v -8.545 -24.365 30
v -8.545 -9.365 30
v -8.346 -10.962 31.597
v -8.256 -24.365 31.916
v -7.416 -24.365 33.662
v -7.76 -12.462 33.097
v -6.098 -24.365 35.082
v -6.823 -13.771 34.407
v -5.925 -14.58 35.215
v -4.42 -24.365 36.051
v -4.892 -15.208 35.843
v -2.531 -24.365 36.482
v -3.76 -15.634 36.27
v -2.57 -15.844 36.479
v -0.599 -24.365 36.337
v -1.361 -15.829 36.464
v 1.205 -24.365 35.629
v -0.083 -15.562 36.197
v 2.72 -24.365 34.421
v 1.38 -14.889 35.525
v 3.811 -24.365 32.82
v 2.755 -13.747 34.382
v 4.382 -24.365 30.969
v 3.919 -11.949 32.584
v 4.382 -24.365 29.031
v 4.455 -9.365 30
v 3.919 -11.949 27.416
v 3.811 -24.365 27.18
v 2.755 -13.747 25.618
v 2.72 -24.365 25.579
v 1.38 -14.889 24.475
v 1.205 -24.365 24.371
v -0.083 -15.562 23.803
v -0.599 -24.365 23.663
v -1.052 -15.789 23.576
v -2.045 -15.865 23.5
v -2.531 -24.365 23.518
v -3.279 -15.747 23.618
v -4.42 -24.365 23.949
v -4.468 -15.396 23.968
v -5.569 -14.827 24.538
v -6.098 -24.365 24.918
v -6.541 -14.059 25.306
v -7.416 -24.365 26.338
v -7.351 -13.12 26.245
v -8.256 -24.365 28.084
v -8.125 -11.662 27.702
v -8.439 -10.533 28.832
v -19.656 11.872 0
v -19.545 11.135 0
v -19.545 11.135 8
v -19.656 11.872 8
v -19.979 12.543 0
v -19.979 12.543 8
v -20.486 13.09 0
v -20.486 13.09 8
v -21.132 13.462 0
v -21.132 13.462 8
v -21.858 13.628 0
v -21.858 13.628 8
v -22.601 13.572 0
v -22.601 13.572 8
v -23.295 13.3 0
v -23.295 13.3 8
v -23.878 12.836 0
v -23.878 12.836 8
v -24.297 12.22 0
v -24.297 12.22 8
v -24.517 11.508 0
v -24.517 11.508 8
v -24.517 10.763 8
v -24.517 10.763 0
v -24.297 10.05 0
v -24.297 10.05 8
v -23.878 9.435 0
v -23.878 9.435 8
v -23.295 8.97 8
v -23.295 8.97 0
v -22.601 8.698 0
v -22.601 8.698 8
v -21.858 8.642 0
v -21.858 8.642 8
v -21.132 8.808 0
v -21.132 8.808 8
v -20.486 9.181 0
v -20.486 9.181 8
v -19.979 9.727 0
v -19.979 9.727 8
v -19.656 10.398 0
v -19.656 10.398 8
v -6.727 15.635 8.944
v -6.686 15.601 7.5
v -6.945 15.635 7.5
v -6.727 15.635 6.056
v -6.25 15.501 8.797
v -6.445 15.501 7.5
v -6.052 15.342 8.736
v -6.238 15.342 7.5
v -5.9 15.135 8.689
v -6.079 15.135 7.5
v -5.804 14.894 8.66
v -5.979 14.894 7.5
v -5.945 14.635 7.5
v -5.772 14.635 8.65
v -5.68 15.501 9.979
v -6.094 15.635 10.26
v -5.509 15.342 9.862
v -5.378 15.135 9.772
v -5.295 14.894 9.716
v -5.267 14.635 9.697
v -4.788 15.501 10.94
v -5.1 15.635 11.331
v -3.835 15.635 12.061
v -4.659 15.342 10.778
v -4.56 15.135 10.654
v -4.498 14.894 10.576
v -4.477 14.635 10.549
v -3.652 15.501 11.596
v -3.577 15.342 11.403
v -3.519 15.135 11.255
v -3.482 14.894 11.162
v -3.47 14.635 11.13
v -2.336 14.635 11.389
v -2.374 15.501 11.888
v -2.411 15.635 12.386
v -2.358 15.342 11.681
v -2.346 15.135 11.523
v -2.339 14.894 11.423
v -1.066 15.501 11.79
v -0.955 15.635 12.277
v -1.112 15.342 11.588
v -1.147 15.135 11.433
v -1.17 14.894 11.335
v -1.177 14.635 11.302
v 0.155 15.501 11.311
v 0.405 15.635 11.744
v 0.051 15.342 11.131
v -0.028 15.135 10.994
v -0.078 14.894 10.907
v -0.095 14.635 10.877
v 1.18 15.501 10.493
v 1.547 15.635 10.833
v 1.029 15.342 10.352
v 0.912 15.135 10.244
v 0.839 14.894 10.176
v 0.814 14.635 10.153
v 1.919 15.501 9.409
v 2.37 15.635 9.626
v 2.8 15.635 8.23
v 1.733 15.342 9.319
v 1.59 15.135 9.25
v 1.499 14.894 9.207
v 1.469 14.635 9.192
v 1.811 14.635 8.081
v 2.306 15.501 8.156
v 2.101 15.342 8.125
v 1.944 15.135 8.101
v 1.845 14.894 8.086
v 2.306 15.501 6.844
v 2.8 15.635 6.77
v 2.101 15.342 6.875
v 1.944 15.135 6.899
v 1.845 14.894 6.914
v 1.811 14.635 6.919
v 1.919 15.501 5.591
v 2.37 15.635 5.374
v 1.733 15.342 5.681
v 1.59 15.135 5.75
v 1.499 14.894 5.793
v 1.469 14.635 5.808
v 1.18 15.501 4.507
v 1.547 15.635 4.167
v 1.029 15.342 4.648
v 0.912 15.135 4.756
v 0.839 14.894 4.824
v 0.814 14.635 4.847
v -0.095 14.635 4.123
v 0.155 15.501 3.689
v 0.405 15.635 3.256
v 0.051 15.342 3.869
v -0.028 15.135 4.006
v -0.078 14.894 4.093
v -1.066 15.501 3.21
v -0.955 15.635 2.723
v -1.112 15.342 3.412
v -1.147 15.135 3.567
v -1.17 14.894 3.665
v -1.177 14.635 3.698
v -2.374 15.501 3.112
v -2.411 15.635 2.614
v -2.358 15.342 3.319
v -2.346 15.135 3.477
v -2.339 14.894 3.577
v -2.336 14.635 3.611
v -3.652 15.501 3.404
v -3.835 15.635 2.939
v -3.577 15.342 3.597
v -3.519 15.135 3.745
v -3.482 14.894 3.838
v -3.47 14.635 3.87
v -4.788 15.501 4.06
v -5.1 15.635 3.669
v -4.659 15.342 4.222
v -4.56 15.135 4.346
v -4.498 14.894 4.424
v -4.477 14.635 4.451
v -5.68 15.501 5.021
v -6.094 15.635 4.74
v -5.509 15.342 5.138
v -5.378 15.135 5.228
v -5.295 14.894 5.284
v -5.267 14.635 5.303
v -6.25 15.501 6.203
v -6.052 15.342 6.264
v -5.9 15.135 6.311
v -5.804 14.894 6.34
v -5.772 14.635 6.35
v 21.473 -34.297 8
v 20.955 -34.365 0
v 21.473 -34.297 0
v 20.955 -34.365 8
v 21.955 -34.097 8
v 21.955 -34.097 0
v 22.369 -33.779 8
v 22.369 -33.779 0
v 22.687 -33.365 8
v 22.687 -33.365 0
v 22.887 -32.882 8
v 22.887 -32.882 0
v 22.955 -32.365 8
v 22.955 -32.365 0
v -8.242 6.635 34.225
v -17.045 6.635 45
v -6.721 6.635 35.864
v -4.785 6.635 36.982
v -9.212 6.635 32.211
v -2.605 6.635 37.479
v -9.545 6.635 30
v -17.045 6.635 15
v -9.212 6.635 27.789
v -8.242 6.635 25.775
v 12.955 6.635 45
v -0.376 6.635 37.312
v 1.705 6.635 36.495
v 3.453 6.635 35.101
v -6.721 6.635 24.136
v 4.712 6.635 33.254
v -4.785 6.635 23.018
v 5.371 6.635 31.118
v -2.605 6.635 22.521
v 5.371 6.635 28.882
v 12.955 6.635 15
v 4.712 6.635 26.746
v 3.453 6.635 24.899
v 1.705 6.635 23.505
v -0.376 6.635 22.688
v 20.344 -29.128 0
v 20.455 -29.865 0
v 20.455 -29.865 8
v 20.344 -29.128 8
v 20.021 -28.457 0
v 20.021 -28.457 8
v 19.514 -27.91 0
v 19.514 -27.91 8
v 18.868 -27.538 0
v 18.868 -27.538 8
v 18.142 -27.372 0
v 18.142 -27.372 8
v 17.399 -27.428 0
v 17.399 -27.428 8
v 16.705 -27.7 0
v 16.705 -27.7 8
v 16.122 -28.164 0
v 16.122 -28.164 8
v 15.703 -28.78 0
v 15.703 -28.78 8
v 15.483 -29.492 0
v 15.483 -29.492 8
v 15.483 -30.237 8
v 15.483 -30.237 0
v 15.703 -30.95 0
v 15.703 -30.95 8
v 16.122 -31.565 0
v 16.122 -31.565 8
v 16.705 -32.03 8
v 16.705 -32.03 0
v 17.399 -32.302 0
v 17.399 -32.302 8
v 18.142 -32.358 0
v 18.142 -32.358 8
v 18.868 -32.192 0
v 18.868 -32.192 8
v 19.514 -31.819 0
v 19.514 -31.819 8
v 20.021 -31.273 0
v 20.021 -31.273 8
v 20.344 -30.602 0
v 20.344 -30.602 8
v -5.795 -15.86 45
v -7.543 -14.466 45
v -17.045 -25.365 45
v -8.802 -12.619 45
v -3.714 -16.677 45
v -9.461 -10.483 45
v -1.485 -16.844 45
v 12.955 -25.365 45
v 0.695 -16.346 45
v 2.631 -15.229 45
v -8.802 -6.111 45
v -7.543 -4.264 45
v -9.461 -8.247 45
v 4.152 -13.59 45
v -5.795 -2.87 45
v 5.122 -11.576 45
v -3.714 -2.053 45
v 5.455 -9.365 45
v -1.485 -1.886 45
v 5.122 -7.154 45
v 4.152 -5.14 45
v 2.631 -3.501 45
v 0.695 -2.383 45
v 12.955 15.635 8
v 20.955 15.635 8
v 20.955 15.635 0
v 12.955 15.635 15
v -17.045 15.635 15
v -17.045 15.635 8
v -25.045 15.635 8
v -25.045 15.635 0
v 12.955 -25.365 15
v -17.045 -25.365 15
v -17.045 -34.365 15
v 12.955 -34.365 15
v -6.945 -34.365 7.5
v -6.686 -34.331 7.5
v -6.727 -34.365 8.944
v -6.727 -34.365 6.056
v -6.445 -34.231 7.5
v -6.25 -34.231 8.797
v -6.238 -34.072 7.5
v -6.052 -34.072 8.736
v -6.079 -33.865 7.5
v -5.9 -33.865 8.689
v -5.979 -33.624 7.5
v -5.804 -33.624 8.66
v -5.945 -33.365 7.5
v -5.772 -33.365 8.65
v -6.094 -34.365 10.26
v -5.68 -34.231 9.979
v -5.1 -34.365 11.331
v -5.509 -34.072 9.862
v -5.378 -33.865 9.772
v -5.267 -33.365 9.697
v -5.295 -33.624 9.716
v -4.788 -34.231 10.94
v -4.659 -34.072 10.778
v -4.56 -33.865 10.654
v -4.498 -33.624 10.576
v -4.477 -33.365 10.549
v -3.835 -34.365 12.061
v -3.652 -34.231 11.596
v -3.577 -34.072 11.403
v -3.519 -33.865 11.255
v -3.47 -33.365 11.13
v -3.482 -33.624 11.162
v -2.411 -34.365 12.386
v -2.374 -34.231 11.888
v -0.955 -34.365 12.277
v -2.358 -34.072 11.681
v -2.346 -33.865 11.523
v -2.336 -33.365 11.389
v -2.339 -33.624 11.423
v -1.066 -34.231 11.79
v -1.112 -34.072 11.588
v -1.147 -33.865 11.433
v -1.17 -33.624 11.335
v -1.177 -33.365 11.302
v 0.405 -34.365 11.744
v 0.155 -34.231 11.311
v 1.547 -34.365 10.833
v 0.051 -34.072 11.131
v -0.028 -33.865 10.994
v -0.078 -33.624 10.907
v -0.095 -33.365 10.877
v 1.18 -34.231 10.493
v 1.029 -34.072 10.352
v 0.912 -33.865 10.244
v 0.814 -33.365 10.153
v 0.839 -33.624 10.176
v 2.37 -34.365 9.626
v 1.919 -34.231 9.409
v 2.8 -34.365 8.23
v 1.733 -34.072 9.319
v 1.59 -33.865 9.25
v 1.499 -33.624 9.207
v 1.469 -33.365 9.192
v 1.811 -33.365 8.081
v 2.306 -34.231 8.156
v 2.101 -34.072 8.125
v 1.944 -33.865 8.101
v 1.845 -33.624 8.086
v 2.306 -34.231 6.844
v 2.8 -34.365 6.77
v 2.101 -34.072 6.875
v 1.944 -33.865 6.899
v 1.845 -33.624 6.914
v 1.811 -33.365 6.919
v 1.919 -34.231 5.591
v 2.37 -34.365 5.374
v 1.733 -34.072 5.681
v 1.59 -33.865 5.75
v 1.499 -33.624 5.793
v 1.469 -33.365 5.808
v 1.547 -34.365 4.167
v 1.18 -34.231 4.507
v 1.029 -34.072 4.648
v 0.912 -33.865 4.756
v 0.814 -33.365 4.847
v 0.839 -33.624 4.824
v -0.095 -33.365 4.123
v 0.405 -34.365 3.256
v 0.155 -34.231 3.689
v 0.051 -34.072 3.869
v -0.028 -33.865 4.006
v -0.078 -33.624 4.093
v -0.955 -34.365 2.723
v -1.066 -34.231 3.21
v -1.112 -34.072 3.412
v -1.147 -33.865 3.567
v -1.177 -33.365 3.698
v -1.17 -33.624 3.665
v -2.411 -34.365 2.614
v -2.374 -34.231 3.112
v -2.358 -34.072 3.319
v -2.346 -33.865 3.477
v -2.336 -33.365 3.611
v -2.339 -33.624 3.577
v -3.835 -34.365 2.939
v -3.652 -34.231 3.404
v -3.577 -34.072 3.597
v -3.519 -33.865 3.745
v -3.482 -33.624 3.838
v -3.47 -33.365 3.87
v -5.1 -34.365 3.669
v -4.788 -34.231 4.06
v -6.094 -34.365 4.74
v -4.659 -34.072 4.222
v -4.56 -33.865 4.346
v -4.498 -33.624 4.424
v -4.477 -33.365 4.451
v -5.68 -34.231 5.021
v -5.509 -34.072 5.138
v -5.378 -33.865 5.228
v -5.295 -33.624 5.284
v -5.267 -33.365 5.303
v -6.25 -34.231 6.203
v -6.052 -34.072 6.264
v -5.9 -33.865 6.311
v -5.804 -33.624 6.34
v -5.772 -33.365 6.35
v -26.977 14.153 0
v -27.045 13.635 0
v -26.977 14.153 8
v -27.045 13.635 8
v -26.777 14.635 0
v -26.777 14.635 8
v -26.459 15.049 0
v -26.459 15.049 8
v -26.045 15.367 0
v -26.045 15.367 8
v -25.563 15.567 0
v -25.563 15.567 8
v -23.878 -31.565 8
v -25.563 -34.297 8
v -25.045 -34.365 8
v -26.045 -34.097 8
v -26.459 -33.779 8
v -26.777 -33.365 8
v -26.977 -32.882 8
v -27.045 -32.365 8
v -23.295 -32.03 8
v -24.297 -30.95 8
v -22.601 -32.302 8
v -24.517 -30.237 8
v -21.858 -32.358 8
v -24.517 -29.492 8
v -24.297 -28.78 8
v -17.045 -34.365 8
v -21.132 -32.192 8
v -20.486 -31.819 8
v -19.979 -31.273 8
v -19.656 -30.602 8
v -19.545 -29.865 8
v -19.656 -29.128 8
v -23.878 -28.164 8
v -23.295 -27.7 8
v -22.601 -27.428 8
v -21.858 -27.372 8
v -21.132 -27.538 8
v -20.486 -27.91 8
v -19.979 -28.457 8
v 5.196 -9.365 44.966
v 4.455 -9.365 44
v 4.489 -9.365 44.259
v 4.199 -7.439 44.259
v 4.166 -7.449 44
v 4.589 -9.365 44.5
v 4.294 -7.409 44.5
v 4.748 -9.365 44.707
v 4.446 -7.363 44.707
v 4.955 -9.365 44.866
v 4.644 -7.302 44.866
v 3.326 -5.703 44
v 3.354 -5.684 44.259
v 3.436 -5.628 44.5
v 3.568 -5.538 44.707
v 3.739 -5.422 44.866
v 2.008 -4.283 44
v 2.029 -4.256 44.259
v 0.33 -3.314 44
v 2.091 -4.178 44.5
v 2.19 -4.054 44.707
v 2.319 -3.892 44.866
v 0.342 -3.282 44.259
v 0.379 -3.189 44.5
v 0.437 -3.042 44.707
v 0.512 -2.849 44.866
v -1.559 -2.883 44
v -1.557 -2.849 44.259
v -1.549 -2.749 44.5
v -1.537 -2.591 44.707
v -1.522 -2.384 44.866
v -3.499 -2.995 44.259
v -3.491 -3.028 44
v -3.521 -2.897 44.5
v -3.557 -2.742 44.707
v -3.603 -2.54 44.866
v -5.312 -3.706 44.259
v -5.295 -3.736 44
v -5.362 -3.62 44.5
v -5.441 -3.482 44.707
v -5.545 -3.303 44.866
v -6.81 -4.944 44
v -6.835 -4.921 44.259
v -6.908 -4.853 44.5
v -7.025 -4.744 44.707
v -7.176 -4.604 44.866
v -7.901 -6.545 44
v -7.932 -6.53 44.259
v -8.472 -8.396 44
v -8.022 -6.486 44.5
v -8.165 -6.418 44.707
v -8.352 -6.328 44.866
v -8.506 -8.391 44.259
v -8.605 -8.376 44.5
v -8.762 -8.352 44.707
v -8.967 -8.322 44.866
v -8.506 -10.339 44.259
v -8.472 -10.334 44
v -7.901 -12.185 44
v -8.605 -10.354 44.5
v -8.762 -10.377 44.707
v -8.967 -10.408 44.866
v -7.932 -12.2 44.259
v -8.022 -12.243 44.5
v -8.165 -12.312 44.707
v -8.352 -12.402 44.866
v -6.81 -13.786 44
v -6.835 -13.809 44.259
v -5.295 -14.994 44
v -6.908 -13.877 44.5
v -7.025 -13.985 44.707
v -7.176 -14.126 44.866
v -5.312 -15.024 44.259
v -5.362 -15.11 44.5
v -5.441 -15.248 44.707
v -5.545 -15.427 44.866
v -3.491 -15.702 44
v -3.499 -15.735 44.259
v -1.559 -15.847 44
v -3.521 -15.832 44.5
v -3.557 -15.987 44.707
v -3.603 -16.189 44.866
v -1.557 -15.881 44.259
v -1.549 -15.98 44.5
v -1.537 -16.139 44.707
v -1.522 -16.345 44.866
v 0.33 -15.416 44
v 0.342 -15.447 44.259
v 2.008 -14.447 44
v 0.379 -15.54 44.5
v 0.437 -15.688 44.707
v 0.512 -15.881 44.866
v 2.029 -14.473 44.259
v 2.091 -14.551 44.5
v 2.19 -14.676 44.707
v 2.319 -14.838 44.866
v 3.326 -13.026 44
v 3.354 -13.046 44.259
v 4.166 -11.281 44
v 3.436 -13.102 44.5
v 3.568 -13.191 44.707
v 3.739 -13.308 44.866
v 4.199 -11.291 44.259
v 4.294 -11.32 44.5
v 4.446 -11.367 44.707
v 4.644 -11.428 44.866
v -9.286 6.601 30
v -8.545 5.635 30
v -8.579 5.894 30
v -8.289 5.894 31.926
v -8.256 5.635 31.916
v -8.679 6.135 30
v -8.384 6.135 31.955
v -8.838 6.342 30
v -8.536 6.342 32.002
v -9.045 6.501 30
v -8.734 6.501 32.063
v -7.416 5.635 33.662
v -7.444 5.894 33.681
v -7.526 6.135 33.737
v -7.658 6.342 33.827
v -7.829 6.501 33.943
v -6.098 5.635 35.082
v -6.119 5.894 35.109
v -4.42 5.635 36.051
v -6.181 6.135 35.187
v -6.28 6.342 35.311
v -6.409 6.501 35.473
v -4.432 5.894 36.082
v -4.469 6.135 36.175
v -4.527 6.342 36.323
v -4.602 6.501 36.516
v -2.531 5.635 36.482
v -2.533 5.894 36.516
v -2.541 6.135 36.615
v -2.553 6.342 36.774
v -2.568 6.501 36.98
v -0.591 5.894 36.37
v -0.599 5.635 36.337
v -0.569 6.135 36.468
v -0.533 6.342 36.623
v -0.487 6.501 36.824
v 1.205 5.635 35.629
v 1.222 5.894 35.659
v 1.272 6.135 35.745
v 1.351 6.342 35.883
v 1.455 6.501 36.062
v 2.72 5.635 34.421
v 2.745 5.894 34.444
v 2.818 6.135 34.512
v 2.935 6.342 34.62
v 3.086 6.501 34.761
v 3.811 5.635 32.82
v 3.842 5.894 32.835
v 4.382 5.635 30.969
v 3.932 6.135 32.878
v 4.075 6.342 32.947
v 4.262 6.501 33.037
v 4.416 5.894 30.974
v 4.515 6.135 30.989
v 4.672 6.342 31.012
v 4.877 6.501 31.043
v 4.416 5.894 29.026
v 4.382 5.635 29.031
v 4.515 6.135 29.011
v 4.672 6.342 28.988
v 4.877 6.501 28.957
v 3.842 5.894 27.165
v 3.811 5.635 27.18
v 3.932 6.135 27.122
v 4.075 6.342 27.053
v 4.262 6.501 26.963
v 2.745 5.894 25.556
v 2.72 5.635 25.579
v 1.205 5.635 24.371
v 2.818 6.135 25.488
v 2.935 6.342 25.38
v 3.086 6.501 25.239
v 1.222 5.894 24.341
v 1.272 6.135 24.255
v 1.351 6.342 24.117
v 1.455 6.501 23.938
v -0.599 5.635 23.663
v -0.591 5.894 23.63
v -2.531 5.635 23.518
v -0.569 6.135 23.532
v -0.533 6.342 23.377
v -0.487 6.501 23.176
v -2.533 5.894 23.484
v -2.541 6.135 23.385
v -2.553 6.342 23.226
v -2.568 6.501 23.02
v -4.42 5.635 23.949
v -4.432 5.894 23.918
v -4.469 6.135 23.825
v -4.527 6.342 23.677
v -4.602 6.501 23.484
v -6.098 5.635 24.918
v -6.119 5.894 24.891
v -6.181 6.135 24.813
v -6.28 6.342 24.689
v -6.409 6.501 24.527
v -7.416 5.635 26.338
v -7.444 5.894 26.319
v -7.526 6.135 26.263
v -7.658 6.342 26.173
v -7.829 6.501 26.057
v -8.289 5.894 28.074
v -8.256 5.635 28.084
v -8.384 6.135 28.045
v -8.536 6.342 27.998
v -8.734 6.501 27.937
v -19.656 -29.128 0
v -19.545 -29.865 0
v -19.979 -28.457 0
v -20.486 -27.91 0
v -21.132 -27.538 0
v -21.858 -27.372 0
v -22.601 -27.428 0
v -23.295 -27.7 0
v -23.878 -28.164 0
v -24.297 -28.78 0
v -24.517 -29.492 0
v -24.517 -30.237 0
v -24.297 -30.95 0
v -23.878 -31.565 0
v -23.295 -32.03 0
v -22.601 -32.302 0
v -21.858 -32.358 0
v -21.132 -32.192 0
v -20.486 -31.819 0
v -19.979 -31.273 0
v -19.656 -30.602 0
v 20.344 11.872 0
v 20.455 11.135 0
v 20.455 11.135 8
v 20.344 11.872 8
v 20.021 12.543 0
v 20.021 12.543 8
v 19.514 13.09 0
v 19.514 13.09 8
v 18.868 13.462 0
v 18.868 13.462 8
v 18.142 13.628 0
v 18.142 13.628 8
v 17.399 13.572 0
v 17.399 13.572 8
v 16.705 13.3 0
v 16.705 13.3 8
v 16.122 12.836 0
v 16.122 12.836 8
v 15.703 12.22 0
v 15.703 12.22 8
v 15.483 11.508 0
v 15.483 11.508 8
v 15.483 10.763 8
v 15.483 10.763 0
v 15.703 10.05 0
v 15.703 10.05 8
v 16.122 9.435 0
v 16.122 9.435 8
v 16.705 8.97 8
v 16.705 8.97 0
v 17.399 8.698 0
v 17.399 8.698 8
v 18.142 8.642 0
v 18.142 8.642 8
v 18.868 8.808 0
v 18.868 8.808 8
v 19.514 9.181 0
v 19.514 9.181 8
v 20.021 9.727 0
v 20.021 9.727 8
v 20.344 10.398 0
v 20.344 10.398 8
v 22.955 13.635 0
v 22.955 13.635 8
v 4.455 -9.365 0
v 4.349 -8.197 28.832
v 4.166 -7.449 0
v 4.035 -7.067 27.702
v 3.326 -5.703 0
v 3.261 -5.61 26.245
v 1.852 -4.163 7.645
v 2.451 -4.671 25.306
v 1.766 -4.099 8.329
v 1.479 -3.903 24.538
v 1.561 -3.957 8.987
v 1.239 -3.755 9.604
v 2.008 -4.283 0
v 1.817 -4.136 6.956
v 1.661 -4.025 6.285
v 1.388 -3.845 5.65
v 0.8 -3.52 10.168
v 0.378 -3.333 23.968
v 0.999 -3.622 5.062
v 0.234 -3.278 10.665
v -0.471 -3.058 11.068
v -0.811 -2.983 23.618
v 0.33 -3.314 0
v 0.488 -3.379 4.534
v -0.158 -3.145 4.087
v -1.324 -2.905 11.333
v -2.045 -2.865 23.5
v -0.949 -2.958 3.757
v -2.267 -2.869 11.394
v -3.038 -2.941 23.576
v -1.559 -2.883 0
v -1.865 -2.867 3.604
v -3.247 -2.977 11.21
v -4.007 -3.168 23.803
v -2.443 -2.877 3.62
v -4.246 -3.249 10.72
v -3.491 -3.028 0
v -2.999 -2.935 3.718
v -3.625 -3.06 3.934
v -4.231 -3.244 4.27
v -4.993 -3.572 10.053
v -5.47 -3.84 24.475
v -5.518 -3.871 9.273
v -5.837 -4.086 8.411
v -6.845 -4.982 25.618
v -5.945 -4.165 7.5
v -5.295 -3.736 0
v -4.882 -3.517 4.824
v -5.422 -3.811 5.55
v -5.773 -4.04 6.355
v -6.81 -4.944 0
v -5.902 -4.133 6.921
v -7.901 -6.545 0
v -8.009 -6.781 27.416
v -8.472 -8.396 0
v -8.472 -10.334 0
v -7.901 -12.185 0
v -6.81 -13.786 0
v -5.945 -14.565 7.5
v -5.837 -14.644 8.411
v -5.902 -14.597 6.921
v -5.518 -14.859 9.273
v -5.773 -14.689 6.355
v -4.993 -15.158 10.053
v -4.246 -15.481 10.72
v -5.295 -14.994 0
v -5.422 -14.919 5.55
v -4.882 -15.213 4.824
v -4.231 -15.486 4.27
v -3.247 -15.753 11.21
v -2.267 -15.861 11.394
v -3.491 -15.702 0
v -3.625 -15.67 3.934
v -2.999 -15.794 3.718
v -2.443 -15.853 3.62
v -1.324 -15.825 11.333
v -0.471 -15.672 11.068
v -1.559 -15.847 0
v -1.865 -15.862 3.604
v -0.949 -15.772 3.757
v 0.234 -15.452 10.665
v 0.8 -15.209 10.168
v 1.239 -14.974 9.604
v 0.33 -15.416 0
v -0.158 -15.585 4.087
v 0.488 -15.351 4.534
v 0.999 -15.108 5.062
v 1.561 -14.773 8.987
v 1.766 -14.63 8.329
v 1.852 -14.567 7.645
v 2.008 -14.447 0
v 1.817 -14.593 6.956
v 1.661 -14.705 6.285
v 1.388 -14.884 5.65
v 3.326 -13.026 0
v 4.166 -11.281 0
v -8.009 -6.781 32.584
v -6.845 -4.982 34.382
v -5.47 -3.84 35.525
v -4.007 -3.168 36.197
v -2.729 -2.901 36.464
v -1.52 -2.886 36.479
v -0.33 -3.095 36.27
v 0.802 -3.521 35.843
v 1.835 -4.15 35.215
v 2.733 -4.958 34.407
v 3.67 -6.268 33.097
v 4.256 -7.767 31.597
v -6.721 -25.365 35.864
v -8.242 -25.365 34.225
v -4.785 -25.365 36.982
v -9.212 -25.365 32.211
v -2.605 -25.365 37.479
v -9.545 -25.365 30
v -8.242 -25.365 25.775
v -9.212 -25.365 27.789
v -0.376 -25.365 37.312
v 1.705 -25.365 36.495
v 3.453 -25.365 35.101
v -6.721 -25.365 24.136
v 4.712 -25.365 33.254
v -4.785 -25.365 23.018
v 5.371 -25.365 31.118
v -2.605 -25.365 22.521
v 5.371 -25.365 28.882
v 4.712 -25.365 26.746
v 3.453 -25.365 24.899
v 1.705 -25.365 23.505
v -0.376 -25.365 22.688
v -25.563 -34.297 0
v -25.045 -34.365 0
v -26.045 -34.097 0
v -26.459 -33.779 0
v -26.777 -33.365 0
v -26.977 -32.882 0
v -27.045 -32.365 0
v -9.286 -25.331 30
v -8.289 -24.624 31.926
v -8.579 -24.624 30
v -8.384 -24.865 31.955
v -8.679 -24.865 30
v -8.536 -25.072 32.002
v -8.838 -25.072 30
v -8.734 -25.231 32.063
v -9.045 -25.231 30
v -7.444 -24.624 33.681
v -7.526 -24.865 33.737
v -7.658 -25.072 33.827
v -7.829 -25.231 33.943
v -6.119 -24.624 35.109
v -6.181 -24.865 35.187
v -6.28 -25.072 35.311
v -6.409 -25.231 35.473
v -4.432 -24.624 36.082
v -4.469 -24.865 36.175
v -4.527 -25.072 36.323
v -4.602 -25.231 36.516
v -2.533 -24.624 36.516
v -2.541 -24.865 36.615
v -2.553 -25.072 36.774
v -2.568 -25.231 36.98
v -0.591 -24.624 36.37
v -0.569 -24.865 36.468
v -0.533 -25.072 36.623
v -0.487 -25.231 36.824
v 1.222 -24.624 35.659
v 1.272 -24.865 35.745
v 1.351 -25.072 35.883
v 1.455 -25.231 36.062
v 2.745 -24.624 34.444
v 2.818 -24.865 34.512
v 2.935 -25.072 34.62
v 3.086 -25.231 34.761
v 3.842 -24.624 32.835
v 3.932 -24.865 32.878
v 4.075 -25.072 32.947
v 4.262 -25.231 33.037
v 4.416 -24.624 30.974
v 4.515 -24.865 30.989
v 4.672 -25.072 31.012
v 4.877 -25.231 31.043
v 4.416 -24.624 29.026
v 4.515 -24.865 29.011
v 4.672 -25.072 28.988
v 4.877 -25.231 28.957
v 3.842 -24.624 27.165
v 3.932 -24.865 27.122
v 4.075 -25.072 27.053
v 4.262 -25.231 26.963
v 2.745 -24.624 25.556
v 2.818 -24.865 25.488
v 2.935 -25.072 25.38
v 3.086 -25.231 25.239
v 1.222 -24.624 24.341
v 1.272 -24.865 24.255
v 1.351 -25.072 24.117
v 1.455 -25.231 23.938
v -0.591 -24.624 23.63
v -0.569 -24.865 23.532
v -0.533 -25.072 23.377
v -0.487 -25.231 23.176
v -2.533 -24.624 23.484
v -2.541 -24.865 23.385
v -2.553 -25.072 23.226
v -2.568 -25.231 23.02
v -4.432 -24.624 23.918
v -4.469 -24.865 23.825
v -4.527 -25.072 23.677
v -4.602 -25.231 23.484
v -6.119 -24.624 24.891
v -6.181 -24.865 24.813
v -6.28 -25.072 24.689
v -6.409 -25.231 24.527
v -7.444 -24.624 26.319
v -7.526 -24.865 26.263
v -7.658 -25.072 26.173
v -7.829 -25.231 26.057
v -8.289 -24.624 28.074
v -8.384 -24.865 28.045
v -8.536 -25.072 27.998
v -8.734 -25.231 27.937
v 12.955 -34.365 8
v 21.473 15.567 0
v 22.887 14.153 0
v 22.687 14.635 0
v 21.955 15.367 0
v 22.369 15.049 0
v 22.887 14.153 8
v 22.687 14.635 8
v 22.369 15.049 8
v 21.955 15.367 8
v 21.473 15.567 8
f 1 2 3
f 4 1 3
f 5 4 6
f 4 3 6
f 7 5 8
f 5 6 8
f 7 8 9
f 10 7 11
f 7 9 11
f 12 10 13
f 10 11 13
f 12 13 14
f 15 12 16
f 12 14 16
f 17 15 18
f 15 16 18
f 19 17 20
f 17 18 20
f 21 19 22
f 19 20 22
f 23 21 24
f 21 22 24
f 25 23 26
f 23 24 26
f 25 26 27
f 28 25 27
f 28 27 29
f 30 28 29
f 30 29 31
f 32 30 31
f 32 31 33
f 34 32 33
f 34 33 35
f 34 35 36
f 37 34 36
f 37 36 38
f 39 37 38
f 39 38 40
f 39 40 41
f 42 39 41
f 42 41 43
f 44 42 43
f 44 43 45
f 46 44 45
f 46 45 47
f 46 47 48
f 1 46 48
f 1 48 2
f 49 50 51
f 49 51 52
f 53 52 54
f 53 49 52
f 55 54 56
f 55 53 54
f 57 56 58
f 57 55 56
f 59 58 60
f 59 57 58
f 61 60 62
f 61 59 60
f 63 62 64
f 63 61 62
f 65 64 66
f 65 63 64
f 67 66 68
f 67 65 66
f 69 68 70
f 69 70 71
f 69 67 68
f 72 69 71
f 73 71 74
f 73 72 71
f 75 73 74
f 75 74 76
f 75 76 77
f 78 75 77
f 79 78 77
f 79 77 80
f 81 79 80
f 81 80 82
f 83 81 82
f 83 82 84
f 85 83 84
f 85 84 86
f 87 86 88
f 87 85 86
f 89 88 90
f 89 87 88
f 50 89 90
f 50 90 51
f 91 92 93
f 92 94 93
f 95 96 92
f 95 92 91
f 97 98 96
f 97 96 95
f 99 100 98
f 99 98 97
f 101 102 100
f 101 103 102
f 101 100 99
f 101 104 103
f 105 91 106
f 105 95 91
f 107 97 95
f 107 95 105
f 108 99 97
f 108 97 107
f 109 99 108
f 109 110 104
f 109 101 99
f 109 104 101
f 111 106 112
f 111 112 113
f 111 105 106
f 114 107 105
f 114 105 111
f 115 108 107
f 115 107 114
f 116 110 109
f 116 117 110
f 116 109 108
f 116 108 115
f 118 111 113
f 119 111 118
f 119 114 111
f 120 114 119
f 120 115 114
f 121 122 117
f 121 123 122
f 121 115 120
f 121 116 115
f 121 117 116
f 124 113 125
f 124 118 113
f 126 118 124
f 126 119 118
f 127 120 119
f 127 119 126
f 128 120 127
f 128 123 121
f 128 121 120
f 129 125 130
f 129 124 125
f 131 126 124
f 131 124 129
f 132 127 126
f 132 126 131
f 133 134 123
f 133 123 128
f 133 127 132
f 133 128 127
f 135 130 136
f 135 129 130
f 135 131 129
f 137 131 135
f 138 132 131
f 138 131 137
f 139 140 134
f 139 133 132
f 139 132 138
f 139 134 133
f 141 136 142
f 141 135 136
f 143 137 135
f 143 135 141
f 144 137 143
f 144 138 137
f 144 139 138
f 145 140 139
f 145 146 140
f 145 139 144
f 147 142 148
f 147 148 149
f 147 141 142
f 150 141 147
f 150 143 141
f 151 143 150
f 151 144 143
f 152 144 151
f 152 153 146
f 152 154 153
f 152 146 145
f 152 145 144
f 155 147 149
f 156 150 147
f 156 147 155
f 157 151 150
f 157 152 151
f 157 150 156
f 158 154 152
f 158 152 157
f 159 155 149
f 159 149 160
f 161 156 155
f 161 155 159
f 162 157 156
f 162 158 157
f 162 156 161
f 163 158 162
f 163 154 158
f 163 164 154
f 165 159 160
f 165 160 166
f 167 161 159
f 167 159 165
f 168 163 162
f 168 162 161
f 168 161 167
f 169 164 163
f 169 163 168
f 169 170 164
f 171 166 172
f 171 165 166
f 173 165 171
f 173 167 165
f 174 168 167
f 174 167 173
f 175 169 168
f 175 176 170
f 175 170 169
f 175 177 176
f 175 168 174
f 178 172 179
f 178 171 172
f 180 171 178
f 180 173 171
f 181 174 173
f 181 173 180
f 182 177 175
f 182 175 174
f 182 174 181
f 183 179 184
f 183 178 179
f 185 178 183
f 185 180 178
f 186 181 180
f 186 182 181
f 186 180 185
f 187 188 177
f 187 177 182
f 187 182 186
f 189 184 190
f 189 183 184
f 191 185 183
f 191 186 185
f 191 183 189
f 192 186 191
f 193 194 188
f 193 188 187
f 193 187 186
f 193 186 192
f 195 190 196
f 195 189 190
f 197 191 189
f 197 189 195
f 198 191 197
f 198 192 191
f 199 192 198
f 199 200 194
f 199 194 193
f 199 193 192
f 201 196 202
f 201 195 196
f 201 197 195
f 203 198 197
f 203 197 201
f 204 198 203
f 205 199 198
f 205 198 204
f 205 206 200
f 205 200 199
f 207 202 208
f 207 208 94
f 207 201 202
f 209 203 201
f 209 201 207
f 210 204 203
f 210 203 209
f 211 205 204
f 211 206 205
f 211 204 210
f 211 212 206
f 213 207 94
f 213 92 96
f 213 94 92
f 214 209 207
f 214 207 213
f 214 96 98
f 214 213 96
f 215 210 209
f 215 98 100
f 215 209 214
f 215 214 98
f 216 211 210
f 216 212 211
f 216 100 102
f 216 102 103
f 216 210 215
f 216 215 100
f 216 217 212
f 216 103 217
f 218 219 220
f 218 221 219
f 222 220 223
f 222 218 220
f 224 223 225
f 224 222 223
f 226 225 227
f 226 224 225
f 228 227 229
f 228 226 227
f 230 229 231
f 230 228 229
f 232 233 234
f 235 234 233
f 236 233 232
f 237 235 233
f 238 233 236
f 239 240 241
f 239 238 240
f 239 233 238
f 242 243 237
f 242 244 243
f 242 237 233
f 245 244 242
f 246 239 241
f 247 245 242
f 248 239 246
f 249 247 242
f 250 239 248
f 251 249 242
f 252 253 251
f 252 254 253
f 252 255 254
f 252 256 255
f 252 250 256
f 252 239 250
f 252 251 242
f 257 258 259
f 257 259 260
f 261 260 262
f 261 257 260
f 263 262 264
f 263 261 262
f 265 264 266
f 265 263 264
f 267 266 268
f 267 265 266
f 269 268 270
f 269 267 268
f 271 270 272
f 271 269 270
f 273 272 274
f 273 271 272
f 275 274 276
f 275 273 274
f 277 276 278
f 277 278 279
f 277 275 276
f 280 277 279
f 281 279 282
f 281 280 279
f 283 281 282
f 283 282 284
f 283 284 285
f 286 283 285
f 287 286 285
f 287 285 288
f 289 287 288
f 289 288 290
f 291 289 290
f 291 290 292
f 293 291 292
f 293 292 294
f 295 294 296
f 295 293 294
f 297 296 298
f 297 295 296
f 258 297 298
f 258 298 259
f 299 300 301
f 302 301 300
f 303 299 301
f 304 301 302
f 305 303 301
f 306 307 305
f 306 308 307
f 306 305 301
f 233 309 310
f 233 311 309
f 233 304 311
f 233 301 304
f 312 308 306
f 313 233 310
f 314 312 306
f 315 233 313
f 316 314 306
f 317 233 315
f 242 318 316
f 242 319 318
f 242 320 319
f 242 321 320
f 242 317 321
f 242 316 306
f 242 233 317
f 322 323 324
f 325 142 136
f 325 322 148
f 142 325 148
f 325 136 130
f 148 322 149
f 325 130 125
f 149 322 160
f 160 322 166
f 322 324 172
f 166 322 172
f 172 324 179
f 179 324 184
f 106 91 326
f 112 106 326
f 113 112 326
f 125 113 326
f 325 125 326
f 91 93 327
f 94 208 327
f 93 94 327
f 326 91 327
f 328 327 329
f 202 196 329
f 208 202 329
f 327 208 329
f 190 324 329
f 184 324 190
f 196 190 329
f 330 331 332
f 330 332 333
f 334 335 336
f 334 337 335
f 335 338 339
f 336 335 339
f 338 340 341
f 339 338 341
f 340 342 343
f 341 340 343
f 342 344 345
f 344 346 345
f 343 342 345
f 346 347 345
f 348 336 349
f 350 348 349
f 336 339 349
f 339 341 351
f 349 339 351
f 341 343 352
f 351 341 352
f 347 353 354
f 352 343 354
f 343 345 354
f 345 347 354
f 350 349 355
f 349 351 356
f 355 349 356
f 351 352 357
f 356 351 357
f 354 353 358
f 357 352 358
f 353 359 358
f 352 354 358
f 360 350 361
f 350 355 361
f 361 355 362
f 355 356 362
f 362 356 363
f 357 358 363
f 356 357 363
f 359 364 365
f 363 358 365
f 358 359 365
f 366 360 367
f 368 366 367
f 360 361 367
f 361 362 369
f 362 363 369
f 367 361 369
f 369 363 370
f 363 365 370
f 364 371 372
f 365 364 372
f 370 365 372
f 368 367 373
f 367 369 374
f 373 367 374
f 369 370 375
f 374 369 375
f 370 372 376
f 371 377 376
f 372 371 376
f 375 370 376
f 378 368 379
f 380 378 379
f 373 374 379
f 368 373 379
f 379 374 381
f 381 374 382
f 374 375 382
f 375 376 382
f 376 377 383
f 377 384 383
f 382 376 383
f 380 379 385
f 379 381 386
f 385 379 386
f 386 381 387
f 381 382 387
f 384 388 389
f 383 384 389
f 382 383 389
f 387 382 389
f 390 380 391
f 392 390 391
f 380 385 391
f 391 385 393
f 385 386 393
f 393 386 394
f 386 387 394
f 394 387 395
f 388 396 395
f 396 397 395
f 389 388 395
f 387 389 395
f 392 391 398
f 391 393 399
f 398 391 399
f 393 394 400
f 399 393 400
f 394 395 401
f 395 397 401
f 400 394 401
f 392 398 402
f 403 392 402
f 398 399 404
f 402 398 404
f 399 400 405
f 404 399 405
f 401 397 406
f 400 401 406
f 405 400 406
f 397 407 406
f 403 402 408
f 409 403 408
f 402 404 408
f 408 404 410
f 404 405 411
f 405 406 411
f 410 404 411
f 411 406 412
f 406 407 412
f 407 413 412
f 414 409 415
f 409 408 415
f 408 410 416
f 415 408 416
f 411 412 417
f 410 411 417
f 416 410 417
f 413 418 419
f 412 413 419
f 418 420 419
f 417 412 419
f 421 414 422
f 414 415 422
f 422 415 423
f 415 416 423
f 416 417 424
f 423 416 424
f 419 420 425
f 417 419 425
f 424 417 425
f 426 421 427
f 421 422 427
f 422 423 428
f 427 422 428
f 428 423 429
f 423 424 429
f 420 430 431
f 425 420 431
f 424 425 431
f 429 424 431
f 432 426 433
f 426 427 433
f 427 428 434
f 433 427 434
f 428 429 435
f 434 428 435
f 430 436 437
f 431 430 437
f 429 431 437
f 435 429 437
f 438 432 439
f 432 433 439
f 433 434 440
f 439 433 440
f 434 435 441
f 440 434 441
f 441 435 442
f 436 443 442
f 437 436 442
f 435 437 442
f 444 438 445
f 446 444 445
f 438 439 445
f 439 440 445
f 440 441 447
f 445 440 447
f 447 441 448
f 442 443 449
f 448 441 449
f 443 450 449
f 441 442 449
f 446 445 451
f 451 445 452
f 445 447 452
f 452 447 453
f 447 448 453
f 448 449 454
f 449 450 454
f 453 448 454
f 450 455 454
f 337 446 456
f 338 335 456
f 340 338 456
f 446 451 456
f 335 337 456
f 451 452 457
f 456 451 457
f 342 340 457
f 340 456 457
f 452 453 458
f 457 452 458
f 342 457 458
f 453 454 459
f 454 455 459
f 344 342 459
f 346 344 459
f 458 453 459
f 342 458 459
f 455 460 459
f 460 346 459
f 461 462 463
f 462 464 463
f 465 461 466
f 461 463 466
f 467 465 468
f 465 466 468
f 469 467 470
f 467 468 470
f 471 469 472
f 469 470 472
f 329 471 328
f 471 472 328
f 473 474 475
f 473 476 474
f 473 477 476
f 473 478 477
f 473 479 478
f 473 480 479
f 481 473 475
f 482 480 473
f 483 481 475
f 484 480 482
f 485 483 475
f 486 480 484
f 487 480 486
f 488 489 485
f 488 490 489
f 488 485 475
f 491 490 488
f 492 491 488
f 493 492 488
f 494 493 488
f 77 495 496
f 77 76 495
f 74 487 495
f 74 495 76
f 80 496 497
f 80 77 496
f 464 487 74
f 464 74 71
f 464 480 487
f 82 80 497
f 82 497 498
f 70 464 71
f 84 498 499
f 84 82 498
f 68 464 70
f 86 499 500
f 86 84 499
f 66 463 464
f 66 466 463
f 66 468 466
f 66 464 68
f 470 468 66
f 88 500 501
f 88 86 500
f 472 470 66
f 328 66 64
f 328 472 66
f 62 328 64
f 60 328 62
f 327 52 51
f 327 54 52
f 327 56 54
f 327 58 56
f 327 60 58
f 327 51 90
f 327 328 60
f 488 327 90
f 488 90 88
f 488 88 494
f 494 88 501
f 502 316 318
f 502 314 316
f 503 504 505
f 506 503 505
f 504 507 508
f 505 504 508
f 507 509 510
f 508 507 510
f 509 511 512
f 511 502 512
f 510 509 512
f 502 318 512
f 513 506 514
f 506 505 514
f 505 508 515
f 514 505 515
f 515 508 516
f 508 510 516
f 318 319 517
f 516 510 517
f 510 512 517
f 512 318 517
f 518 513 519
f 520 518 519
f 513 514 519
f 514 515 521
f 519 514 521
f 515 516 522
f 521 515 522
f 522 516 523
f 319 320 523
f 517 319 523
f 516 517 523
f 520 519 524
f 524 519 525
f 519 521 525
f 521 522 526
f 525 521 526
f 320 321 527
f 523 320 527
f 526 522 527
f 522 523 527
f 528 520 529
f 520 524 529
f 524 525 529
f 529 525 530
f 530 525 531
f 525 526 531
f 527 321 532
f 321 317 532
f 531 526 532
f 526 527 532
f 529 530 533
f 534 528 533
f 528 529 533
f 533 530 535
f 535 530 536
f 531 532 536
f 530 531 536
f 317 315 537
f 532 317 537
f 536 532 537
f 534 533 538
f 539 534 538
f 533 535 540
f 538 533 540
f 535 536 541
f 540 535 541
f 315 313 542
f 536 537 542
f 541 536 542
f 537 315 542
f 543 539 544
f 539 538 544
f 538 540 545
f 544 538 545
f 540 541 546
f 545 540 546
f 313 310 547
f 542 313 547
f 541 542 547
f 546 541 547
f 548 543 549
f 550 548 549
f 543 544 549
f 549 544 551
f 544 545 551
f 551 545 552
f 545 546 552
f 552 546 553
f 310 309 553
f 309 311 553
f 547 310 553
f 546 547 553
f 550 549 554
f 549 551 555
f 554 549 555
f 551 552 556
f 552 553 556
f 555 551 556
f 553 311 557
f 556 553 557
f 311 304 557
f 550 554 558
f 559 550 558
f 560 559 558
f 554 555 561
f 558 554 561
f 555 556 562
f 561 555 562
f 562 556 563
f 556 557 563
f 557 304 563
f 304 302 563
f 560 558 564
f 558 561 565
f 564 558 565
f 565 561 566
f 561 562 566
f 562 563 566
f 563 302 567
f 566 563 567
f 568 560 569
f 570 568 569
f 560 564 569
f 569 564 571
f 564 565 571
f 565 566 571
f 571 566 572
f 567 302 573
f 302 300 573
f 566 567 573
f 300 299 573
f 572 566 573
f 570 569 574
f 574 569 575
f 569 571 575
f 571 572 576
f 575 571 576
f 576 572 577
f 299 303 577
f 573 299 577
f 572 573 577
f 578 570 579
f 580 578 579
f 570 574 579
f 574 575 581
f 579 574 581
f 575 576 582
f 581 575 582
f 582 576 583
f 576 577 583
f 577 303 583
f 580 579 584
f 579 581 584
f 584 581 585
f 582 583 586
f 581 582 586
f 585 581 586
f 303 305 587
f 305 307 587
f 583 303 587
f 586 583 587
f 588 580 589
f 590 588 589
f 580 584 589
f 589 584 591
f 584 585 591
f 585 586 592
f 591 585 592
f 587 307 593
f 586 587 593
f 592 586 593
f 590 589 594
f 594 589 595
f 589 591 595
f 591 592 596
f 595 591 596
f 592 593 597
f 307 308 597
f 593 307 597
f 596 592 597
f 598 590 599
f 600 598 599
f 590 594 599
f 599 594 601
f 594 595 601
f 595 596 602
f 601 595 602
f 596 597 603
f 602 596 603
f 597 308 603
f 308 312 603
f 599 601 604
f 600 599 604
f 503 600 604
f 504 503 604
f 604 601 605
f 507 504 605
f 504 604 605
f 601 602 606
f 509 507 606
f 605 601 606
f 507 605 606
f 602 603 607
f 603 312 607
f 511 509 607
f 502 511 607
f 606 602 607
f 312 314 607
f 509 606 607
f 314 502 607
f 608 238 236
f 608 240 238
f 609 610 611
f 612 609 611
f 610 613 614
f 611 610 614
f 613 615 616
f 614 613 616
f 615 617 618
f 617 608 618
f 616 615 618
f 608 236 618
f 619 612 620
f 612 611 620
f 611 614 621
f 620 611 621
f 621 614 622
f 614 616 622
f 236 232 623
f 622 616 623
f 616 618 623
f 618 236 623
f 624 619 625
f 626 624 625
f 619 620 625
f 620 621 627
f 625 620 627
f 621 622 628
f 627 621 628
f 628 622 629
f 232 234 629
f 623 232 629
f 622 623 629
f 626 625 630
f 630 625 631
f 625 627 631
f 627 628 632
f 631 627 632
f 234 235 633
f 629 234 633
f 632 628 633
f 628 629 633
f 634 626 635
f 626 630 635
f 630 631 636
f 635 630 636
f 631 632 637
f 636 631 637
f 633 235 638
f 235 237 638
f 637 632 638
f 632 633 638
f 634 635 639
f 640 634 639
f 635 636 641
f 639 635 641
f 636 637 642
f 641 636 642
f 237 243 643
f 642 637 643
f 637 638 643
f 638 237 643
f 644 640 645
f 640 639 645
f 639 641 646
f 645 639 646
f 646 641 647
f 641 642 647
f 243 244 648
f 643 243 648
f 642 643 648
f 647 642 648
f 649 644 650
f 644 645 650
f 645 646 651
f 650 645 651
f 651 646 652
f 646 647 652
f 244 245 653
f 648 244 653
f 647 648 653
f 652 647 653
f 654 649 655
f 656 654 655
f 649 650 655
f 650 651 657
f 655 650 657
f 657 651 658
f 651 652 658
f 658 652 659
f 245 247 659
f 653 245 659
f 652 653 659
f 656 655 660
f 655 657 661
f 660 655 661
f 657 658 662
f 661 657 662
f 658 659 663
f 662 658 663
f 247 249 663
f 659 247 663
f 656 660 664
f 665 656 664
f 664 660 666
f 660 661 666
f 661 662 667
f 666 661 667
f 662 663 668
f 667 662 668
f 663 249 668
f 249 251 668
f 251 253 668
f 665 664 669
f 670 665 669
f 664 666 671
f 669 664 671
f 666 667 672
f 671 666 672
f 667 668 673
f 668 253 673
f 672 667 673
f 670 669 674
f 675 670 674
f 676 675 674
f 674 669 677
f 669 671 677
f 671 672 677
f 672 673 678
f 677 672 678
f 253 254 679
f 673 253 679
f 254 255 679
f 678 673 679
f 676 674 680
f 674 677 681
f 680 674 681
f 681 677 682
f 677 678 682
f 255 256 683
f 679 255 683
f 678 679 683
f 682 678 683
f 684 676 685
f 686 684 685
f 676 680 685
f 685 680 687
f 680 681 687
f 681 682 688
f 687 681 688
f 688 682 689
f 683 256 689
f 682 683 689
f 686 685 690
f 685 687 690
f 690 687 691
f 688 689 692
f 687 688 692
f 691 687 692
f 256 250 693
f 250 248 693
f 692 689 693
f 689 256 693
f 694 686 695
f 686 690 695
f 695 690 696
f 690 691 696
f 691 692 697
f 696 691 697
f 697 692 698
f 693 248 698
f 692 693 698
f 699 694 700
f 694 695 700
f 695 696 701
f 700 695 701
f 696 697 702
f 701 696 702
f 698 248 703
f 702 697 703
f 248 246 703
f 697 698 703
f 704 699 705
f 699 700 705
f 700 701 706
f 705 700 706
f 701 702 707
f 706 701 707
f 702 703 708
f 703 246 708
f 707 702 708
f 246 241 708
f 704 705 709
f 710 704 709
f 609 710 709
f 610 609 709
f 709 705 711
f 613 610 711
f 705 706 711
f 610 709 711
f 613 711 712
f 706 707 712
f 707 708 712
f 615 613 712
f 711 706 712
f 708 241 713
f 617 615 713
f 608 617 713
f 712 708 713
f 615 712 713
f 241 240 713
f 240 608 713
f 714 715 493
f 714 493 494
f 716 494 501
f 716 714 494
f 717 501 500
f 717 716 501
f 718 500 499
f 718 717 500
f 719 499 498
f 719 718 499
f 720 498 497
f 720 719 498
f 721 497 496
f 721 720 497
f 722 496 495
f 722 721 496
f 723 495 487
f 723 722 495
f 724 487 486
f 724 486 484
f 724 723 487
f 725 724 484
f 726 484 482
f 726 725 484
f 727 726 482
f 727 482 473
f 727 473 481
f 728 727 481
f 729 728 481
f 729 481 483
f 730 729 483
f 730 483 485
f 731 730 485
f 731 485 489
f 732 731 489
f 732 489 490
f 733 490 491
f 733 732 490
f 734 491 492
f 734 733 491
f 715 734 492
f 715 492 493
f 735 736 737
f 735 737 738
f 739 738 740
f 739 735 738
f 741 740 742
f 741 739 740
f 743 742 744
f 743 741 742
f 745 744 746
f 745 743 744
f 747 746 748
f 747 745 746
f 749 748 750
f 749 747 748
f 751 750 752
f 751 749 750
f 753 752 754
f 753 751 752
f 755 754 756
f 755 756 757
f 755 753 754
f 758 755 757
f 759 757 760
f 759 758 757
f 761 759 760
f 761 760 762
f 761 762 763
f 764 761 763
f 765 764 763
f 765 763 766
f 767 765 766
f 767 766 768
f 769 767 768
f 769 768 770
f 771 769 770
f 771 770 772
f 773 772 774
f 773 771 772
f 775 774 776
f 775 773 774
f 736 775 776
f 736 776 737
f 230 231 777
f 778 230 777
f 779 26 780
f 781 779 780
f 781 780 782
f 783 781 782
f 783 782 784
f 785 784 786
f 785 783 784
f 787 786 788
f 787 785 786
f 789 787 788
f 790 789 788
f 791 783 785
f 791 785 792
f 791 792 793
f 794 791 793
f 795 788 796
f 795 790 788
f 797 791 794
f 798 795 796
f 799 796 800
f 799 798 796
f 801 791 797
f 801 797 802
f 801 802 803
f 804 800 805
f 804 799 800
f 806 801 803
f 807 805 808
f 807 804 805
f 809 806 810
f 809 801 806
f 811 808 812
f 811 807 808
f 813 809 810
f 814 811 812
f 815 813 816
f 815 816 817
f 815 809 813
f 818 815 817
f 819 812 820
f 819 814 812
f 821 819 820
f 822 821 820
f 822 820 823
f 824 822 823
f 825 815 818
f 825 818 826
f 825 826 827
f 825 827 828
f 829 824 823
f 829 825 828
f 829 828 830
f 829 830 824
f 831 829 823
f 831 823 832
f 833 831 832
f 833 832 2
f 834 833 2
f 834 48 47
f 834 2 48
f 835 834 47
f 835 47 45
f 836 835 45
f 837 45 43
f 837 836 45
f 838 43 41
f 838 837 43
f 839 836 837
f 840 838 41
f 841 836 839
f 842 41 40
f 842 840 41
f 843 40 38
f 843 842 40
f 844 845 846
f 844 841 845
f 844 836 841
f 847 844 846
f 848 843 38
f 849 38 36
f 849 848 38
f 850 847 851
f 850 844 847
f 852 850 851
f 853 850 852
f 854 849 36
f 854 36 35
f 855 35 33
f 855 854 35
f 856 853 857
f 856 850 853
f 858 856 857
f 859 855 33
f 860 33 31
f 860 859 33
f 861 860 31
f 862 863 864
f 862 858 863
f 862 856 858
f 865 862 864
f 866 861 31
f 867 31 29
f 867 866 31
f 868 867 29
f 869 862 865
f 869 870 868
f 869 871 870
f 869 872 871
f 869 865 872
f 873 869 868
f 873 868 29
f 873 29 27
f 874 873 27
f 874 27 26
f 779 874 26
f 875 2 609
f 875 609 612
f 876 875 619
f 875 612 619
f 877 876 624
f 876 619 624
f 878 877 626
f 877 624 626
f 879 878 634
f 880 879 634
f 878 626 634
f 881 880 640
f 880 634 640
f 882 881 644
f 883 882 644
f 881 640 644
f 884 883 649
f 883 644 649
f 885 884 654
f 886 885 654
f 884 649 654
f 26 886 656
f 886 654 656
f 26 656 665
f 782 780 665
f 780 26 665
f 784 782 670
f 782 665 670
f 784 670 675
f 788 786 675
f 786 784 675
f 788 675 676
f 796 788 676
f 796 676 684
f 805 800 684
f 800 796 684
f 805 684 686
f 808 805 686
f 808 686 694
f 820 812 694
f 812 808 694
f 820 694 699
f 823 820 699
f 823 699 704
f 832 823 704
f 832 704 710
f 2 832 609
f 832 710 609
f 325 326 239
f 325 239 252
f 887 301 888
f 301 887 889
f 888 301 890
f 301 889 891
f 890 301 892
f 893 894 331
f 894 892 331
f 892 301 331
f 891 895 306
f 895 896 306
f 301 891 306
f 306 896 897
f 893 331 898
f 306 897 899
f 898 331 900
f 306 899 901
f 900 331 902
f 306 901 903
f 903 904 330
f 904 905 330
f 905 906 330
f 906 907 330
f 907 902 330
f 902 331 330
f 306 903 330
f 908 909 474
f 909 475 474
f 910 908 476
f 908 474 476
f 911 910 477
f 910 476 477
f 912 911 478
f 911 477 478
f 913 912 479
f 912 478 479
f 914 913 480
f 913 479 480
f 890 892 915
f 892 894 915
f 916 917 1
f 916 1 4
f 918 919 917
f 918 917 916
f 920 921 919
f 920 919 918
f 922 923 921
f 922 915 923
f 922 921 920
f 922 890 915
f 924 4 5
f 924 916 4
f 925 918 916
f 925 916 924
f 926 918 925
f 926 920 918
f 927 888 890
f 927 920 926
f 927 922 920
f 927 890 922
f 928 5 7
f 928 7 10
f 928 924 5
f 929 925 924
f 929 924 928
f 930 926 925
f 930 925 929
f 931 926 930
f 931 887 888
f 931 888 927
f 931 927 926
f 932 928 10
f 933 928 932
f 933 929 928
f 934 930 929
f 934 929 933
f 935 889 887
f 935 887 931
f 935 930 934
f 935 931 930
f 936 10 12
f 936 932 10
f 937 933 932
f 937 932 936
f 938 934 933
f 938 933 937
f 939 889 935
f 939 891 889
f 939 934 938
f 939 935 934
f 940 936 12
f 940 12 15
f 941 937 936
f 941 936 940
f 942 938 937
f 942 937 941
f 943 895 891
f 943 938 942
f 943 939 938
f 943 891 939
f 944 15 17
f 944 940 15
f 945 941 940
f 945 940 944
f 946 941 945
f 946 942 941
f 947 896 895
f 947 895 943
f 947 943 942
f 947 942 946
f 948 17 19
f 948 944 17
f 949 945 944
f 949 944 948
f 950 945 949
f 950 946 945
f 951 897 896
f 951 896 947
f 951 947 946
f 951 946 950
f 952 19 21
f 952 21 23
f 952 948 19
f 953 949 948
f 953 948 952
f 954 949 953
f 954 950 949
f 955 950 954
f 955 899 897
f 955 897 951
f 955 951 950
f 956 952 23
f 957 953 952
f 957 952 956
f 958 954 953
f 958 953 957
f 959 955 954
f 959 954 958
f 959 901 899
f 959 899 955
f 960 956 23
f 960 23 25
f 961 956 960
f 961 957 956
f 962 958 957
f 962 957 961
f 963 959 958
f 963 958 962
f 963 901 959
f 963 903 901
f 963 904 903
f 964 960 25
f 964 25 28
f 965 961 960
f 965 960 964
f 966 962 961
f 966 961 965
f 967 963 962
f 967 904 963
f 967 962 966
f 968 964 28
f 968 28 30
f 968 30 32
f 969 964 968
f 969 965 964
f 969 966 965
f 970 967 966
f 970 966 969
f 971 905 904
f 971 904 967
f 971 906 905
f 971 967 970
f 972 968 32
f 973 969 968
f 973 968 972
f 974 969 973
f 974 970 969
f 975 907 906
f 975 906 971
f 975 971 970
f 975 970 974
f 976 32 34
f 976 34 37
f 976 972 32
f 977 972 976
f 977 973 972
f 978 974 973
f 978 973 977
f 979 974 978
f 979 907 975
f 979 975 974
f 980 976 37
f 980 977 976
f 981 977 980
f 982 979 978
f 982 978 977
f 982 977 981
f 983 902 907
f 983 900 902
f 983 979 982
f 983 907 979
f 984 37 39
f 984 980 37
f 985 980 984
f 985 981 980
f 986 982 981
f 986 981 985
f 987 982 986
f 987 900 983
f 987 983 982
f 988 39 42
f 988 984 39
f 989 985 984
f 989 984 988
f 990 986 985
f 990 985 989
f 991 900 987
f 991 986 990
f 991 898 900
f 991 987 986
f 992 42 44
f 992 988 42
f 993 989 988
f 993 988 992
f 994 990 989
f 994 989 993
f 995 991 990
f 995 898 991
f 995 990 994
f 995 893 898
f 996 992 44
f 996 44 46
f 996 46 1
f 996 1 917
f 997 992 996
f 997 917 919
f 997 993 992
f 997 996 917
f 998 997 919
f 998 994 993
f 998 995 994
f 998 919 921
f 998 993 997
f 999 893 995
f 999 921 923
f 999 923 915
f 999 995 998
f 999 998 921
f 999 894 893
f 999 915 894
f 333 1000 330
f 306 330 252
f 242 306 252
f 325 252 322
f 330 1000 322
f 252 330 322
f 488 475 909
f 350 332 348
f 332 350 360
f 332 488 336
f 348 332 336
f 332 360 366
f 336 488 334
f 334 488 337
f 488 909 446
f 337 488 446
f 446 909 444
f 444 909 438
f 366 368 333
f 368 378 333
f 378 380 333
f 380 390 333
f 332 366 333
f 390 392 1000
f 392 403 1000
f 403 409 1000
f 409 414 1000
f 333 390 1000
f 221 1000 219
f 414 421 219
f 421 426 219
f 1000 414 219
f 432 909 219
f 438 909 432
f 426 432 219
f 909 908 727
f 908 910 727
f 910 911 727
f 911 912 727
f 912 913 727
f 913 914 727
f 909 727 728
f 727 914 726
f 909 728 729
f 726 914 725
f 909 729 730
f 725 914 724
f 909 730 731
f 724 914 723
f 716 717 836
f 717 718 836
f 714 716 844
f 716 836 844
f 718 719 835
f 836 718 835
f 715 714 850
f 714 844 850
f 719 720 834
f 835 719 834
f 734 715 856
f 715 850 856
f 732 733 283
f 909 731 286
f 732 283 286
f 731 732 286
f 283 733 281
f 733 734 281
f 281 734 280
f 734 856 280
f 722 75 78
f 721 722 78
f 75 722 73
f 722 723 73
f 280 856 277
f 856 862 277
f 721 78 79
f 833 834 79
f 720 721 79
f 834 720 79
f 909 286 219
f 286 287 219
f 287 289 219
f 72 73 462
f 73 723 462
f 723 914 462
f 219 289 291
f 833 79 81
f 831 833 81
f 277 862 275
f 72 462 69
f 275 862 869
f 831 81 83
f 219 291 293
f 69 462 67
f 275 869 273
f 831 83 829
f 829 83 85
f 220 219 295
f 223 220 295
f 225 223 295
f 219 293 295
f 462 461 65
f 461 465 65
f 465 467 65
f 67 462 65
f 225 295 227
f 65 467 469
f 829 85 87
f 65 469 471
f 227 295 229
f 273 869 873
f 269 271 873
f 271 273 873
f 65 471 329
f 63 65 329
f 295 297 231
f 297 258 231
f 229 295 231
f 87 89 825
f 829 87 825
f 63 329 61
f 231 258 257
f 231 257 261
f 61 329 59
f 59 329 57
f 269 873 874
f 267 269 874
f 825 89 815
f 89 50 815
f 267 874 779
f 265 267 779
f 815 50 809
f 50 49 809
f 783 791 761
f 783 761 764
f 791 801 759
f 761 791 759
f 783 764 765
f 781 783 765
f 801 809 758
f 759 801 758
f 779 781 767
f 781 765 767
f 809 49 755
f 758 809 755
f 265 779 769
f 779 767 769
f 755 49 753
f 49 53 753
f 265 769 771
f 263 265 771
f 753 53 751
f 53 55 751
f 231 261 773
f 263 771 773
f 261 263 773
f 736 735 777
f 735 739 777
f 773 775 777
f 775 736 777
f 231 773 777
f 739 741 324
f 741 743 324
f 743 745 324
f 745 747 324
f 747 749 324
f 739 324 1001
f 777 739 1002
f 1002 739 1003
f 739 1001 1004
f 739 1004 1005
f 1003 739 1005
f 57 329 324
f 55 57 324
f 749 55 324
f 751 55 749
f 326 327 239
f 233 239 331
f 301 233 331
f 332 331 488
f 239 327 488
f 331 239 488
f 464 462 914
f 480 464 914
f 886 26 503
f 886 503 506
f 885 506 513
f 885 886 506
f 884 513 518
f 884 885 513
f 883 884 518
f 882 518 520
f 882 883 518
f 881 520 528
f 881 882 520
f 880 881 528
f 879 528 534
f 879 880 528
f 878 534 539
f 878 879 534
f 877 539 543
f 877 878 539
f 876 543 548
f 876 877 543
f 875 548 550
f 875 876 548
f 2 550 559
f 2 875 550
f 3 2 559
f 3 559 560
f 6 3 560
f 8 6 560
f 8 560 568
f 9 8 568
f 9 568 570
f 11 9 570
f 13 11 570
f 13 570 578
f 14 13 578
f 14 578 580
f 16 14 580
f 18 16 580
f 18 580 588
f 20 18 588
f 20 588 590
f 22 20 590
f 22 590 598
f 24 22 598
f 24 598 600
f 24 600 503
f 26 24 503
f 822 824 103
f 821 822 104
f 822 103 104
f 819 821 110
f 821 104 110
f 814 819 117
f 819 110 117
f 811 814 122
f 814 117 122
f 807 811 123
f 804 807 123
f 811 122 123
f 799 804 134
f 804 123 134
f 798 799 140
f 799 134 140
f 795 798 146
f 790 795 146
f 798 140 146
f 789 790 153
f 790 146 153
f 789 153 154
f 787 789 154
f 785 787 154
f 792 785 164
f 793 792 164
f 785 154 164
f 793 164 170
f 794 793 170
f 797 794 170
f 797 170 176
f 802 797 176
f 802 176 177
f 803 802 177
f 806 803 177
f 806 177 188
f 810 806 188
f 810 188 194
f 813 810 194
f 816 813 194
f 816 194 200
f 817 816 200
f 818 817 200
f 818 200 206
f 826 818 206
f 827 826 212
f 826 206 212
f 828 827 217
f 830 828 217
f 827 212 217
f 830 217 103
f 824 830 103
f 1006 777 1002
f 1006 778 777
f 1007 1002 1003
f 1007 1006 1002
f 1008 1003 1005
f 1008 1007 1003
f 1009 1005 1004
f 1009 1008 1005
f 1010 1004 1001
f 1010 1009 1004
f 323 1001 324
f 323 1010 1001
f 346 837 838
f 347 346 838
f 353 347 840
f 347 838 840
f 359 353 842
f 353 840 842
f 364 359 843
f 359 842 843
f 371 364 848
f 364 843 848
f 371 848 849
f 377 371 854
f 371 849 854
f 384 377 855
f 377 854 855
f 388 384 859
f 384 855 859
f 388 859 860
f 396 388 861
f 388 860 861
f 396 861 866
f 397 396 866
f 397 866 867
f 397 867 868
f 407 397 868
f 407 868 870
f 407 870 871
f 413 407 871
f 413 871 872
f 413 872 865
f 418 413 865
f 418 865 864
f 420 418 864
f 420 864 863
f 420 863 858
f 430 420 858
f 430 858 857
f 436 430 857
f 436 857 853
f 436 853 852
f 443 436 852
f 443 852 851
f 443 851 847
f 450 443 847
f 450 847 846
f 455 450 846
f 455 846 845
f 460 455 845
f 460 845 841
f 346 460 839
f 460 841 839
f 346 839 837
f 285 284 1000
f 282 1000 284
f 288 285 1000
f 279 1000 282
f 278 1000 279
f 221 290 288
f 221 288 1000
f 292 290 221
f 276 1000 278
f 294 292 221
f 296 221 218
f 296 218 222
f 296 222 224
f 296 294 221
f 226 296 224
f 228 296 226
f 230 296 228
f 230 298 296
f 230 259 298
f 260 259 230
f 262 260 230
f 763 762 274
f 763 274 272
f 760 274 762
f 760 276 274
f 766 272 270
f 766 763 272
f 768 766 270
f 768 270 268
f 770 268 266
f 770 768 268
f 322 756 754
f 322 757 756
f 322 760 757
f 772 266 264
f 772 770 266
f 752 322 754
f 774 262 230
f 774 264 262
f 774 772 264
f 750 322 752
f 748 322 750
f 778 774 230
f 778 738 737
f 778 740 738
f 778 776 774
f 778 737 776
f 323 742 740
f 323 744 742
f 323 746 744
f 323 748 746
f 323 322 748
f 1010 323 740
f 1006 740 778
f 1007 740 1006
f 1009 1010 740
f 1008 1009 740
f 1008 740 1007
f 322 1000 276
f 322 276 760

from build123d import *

# Parameters (mm, degrees)
F0_R     = 2.5
F0_W     = 30
F0_H     = 9
F0_H_2   = 32
F0_R_2   = 6.5
F1_DEPTH = 8
F2_DEPTH = 15
F3_DEPTH = 45
F4_R     = 6.5
F4_R_2   = 3.9
F5_DEPTH = 50.001
F6_R     = 1
F7_R     = 2


with BuildPart() as f1:
    # F0 (on Top) → F1 (new body)
    with BuildSketch(Plane.XY):
        Polygon((-17.0449850708, 15.6351606453), (-27.0449850708, 15.6351606453), (-27.0449850708, -34.3648393547), (-17.0449850708, -34.3648393547), (-17.0449850708, -25.3648393547), (-17.0449850708, 6.6351606453), align=None)
        with Locations((-22.0449850708, -29.8648393547)):
            Circle(F0_R, mode=Mode.SUBTRACT)
        with Locations((-22.0449850708, 11.1351606453)):
            Circle(F0_R, mode=Mode.SUBTRACT)
        with Locations((-2.0449850708, 11.1351606453)):
            Rectangle(F0_W, F0_H)
        Polygon((22.9550149292, 15.6351606453), (12.9550149292, 15.6351606453), (12.9550149292, 6.6351606453), (12.9550149292, -25.3648393547), (12.9550149292, -34.3648393547), (22.9550149292, -34.3648393547), align=None)
        with Locations((17.9550149292, -29.8648393547)):
            Circle(F0_R, mode=Mode.SUBTRACT)
        with Locations((17.9550149292, 11.1351606453)):
            Circle(F0_R, mode=Mode.SUBTRACT)
        with Locations((-2.0449850708, -29.8648393547)):
            Rectangle(F0_W, F0_H)
        with Locations((-2.0449850708, -9.3648393547)):
            Rectangle(F0_W, F0_H_2)
        with Locations((-2.0449850708, -9.3648393547)):
            Circle(F0_R_2, mode=Mode.SUBTRACT)
    extrude(amount=F1_DEPTH)

    # F0 (on Top) → F2 (join)
    with BuildSketch(Plane.XY):
        with Locations((-2.0449850708, 11.1351606453)):
            Rectangle(F0_W, F0_H)
        with Locations((-2.0449850708, -29.8648393547)):
            Rectangle(F0_W, F0_H)
        with Locations((-2.0449850708, -9.3648393547)):
            Rectangle(F0_W, F0_H_2)
        with Locations((-2.0449850708, -9.3648393547)):
            Circle(F0_R_2, mode=Mode.SUBTRACT)
    extrude(amount=F2_DEPTH)

    # F0 (on Top) → F3 (join)
    with BuildSketch(Plane.XY):
        with Locations((-2.0449850708, -9.3648393547)):
            Rectangle(F0_W, F0_H_2)
        with Locations((-2.0449850708, -9.3648393547)):
            Circle(F0_R_2, mode=Mode.SUBTRACT)
    extrude(amount=F3_DEPTH)

    # F4 (on face) → F5 (cut, through all)
    with BuildSketch(Plane(origin=(0, 15.6351606453, 0), x_dir=(-1, 0, 0), z_dir=(0, 1, 0))):
        with Locations((2.0449850708, 30)):
            Circle(F4_R)
        with Locations((2.0449850708, 7.5)):
            Circle(F4_R_2)
    extrude(amount=-F5_DEPTH, mode=Mode.SUBTRACT)

    # F6
    f6_edges = [f1.edges().sort_by_distance(p)[0] for p in [
        (1.855015, 15.635161, 7.5),
        (1.855015, -34.364839, 7.5),
        (-8.544985, -9.364839, 45),
        (4.455015, -25.364839, 30),
        (4.455015, 6.635161, 30),
    ]]
    fillet(f6_edges, radius=F6_R)

    # F7
    f7_edges = [f1.edges().sort_by_distance(p)[0] for p in [
        (-27.044985, -34.364839, 4),
        (22.955015, -34.364839, 4),
        (22.955015, 15.635161, 4),
        (-27.044985, 15.635161, 4),
    ]]
    fillet(f7_edges, radius=F7_R)


solid = f1.part
